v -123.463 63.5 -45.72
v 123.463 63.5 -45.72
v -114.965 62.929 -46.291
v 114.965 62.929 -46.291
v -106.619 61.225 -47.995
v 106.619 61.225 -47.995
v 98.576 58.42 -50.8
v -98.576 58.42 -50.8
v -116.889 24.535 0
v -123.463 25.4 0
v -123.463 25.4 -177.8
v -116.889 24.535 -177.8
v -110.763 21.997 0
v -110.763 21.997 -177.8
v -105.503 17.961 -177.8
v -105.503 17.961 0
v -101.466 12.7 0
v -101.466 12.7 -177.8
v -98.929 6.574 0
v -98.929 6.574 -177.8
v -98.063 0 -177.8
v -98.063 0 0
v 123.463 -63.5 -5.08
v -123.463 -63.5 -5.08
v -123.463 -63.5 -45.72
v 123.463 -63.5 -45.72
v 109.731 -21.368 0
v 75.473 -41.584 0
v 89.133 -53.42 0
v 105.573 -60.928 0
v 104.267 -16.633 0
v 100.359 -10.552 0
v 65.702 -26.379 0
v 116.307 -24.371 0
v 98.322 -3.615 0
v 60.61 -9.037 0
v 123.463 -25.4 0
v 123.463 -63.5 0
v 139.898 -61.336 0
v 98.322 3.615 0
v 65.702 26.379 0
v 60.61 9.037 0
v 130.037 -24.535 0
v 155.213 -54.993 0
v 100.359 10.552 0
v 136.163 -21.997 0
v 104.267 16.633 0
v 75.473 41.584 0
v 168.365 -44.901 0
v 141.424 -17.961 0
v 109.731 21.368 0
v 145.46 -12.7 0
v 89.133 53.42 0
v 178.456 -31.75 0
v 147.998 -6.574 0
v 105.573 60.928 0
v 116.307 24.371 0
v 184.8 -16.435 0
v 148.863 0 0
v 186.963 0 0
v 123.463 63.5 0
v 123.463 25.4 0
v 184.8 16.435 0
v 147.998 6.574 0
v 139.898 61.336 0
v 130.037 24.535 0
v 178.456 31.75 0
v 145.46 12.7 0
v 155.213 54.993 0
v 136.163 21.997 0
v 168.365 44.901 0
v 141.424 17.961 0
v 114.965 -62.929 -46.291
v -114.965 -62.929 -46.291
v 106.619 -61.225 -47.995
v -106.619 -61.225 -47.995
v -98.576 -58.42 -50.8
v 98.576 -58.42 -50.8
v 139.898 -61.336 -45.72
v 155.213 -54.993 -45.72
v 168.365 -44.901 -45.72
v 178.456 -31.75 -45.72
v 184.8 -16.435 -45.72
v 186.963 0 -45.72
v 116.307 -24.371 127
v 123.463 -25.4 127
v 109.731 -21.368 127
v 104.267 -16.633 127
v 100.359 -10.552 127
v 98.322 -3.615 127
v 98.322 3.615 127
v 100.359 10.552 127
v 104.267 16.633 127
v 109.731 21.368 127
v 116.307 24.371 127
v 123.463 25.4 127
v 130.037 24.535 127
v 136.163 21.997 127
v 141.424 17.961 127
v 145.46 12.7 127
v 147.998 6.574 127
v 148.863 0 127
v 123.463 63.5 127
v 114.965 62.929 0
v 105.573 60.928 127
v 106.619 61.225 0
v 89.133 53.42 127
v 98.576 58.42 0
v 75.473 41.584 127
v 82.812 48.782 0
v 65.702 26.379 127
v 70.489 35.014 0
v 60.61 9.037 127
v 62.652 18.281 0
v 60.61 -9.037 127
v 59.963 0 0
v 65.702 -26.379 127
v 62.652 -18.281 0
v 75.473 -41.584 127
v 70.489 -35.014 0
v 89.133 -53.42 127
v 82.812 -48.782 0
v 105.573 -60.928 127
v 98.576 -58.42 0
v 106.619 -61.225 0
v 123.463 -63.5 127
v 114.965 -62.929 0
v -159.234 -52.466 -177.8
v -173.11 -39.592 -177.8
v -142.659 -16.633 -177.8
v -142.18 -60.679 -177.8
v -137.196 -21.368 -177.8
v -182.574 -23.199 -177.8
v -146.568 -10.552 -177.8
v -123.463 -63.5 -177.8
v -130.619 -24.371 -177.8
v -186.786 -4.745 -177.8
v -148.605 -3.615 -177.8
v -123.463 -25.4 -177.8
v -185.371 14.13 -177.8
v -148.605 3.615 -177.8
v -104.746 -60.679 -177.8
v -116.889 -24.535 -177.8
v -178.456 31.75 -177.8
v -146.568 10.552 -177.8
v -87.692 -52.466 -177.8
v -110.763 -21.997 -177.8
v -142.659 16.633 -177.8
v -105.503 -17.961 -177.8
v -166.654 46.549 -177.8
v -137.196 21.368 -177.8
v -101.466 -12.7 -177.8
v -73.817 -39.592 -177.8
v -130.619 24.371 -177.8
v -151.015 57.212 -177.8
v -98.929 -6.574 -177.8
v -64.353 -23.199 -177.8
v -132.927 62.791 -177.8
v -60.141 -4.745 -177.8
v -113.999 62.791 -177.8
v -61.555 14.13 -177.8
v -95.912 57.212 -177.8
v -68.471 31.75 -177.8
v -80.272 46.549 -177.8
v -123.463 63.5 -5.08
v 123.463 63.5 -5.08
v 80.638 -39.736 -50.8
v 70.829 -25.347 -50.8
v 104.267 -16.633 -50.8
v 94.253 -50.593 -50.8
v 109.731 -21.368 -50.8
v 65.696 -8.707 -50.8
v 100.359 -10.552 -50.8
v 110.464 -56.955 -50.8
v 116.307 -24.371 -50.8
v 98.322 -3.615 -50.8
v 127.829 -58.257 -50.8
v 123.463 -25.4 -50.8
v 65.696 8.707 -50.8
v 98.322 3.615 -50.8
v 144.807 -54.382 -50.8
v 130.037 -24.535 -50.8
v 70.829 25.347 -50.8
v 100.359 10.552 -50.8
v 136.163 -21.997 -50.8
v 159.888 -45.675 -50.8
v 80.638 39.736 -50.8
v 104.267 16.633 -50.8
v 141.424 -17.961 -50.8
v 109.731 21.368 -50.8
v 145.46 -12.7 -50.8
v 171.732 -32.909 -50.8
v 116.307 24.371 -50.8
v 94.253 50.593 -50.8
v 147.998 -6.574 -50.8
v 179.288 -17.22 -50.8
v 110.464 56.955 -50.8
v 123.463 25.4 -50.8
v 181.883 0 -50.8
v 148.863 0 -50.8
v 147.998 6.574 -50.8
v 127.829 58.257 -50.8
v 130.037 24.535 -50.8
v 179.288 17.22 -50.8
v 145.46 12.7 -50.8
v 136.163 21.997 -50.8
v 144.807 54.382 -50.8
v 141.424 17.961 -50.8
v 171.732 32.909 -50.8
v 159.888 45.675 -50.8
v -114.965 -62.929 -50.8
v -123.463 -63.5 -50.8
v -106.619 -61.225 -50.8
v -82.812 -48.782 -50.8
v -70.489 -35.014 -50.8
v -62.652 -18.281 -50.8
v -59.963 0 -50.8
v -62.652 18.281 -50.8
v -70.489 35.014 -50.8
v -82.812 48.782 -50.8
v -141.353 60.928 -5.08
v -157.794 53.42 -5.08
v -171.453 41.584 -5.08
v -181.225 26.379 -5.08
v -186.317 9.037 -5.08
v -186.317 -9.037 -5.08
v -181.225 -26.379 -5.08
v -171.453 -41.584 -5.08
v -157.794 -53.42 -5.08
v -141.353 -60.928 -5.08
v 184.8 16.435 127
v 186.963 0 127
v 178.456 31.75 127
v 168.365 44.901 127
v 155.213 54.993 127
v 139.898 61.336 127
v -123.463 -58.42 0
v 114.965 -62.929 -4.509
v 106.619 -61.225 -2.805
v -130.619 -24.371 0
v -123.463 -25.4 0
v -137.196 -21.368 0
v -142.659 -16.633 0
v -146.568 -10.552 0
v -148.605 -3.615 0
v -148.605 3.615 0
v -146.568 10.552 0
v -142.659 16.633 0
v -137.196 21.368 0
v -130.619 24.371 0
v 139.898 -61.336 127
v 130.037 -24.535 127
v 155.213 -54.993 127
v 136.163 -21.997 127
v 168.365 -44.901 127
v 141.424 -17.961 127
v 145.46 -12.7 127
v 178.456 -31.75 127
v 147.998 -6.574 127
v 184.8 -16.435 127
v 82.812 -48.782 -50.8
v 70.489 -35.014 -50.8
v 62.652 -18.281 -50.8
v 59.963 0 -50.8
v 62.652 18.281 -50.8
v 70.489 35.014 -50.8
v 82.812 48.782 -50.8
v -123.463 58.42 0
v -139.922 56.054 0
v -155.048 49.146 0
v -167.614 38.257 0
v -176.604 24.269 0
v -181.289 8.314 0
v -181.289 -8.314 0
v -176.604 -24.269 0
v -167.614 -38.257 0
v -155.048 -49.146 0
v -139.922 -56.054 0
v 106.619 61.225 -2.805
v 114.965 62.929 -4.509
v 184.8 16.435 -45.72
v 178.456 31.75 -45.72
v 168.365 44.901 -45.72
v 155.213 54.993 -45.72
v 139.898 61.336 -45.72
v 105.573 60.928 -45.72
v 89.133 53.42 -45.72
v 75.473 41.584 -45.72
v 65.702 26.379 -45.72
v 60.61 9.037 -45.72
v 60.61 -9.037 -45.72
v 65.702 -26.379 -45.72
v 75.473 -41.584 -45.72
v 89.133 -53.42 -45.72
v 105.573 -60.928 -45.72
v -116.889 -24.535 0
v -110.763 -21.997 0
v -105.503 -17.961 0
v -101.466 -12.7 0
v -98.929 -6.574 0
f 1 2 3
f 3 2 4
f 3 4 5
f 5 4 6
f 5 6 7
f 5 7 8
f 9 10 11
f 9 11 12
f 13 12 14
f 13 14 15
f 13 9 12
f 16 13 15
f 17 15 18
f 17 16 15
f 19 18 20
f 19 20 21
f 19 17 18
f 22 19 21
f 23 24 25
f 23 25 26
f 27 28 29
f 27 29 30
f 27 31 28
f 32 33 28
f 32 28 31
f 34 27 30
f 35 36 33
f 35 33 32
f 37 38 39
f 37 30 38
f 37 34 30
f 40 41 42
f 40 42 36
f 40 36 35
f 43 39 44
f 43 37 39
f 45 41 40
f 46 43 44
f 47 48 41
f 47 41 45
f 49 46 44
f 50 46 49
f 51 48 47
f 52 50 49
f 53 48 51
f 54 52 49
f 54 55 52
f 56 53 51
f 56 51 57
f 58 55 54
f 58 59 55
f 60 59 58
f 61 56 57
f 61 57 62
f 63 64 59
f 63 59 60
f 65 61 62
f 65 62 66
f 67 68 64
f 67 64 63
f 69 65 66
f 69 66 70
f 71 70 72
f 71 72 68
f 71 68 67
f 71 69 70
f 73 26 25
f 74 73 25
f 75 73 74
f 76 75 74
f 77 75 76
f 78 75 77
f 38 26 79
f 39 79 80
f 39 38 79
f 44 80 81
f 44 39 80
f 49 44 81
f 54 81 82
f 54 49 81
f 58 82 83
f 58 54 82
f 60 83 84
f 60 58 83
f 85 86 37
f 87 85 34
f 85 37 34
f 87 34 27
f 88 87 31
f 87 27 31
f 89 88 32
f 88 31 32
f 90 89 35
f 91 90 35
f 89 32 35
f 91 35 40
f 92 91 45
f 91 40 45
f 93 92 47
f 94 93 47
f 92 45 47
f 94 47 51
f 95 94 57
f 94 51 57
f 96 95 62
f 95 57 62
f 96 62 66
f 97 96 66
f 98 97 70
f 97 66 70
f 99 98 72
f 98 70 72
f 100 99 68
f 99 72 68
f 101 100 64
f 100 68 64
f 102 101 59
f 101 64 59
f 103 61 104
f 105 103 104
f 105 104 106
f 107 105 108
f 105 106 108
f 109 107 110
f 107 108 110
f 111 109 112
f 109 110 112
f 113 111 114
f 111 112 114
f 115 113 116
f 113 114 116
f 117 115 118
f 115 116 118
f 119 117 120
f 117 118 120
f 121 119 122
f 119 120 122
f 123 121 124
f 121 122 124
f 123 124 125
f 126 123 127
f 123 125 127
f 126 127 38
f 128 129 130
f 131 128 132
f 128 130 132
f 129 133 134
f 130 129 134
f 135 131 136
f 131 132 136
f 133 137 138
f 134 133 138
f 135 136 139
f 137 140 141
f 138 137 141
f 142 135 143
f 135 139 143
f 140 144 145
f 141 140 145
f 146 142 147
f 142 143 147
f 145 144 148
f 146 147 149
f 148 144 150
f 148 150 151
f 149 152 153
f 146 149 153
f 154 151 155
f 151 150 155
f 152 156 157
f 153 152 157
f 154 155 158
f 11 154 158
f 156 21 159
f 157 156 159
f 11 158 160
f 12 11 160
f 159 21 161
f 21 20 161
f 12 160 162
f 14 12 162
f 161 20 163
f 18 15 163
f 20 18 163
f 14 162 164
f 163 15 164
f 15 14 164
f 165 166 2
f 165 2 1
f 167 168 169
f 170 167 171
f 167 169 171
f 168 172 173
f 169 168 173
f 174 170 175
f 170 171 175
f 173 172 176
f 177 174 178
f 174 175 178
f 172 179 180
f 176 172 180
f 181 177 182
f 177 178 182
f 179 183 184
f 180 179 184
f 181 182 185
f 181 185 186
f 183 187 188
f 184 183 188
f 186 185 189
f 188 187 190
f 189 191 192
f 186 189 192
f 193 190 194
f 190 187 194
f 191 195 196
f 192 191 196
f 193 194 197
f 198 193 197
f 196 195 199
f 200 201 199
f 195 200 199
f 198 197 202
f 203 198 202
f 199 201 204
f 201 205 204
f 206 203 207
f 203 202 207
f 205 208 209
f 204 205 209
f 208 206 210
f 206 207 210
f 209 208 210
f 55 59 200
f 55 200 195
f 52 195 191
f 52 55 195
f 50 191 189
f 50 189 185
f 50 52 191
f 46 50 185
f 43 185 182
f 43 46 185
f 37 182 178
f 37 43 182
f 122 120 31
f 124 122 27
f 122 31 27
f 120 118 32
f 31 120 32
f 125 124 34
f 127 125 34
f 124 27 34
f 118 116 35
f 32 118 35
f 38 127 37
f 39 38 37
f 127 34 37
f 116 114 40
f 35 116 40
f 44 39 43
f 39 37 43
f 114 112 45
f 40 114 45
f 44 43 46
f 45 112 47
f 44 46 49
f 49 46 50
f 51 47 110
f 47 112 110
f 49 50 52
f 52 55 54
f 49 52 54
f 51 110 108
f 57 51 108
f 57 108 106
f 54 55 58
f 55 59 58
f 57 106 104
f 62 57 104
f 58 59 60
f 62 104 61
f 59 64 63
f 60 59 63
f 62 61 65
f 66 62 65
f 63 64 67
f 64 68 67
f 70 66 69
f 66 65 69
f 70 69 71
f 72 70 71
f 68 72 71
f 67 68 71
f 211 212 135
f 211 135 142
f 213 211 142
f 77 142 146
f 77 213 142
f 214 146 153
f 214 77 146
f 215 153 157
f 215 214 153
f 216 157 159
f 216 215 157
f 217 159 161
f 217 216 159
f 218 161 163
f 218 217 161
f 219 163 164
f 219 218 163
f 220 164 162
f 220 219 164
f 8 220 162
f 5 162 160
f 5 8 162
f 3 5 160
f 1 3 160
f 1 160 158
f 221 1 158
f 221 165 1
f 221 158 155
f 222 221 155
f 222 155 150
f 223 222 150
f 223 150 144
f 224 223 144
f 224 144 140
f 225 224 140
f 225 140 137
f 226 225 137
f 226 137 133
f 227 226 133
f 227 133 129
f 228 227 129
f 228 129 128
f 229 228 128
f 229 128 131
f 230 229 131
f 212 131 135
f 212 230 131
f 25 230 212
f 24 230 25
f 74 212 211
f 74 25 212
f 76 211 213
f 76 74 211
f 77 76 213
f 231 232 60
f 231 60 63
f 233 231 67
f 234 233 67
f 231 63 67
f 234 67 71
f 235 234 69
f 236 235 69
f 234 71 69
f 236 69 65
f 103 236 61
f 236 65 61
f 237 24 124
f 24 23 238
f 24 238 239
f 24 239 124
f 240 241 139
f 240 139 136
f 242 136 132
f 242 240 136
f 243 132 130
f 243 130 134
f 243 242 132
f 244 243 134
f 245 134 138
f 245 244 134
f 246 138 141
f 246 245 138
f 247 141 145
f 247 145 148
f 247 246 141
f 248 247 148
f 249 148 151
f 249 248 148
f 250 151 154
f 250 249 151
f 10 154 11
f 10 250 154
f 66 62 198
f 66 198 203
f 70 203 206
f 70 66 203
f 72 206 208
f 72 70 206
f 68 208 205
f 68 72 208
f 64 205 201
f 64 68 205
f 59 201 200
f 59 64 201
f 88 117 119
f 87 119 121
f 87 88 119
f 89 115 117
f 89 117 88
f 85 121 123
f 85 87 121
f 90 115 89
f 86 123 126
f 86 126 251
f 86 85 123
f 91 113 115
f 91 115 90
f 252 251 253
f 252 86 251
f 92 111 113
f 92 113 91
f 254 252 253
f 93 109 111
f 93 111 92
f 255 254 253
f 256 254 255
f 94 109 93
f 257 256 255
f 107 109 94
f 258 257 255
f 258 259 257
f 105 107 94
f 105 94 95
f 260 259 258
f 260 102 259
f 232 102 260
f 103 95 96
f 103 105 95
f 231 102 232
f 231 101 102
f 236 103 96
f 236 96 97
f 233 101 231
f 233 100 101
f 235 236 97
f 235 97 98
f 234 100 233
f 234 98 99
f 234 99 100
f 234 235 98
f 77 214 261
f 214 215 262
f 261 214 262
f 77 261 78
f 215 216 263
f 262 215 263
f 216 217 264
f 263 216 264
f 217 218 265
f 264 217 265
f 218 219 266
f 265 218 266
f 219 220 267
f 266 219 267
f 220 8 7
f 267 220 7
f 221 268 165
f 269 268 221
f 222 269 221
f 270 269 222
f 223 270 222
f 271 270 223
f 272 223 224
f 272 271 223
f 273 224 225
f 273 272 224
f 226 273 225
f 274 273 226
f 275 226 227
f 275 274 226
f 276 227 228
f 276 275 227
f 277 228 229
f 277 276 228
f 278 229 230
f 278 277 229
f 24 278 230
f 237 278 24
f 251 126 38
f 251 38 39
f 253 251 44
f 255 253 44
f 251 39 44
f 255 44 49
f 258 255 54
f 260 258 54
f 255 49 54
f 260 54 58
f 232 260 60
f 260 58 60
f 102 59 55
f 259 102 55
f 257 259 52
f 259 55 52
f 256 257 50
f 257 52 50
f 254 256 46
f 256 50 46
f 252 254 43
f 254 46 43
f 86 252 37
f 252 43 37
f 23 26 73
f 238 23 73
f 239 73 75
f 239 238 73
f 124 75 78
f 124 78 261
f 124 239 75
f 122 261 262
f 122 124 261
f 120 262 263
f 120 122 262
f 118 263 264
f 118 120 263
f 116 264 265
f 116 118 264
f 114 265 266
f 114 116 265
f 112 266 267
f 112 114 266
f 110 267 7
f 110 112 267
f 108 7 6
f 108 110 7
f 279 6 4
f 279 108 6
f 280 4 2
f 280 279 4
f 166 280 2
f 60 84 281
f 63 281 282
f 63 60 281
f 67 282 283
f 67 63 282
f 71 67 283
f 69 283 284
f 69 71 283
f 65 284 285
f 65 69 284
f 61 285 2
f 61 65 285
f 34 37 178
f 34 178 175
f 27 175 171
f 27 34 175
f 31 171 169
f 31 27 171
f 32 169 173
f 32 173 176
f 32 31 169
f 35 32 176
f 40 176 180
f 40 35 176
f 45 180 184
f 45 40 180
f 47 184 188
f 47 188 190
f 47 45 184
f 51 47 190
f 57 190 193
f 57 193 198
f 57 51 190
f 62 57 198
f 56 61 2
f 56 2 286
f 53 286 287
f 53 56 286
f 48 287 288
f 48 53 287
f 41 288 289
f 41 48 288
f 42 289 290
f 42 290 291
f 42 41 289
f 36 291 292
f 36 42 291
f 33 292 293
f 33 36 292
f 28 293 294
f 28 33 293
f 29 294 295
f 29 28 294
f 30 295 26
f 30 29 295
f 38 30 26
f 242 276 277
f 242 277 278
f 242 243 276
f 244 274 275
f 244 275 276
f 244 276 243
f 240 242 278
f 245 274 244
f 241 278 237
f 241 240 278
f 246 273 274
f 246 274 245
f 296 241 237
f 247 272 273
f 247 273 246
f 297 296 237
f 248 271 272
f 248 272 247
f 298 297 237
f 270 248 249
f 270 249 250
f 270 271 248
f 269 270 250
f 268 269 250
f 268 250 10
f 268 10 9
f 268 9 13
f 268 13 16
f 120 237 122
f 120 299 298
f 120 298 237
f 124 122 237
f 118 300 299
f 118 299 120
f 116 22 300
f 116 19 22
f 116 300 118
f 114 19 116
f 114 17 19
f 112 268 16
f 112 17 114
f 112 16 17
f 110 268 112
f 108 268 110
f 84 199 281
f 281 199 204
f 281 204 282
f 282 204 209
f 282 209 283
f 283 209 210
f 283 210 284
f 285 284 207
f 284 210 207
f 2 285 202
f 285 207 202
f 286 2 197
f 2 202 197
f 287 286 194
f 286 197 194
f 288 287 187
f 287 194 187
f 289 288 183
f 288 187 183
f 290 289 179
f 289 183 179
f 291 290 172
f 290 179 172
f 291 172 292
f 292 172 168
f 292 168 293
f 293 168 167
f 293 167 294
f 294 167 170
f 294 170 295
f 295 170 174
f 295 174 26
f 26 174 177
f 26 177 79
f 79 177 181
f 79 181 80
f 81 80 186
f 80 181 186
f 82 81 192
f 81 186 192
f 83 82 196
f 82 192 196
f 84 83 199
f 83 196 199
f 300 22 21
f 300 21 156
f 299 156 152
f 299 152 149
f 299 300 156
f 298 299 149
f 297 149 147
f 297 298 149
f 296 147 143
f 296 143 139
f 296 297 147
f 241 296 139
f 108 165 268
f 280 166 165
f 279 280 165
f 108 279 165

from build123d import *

# Parameters (mm, degrees)
F1_DEPTH     = 127
F2_DEPTH     = 177.8
F3_DEPTH     = 50.8
F4_DEPTH     = 50.8
F5_T1_DEPTH  = 286.1190739645
F5_T4_ANGLE  = 180
F5_T8_DEPTH  = 325.3115227011
F5_S9_R      = 63.5
F5_T10_DEPTH = 164
F5_T14_DEPTH = 325.3115227011
F5_S15_R     = 63.5
F5_T16_DEPTH = 164


# Not quite as in the source:
# - a fillet or chamfer that OpenCascade refuses, or shapes differently, is made with other operations: its cross-section is extruded or revolved along the edge and cut away or added


with BuildPart() as f1:
    # F0 (on Top) → F1 (new body)
    with BuildSketch(Plane.XY):
        with BuildLine():
            ThreePointArc((123.463312614, 63.5), (59.963312614, 0), (123.463312614, -63.5))
            Line((123.463312614, -63.5), (123.463312614, -25.4))
            ThreePointArc((123.463312614, -25.4), (98.063312614, 0), (123.463312614, 25.4))
            Line((123.463312614, 25.4), (123.463312614, 63.5))
        make_face()
        with BuildLine():
            Line((123.463312614, -25.4), (123.463312614, -63.5))
            ThreePointArc((123.463312614, -63.5), (168.3645932193, -44.9012806053), (186.963312614, 0))
            ThreePointArc((186.963312614, 0), (168.3645932193, 44.9012806053), (123.463312614, 63.5))
            Line((123.463312614, 63.5), (123.463312614, 25.4))
            ThreePointArc((123.463312614, 25.4), (141.4238248561, 17.9605122421), (148.863312614, 0))
            ThreePointArc((148.863312614, 0), (141.4238248561, -17.9605122421), (123.463312614, -25.4))
        make_face()
    extrude(amount=F1_DEPTH)



with BuildPart() as f2:
    # F0 (on Top) → F2 (new body)
    with BuildSketch(Plane.XY):
        with BuildLine():
            ThreePointArc((-123.463312614, 63.5), (-186.963312614, 0), (-123.463312614, -63.5))
            Line((-123.463312614, -63.5), (-123.463312614, -25.4))
            ThreePointArc((-123.463312614, -25.4), (-148.863312614, 0), (-123.463312614, 25.4))
            Line((-123.463312614, 25.4), (-123.463312614, 63.5))
        make_face()
        with BuildLine():
            Line((-123.463312614, -25.4), (-123.463312614, -63.5))
            ThreePointArc((-123.463312614, -63.5), (-78.5620320086, -44.9012806053), (-59.963312614, 0))
            ThreePointArc((-59.963312614, 0), (-78.5620320086, 44.9012806053), (-123.463312614, 63.5))
            Line((-123.463312614, 63.5), (-123.463312614, 25.4))
            ThreePointArc((-123.463312614, 25.4), (-105.5028003718, 17.9605122421), (-98.063312614, 0))
            ThreePointArc((-98.063312614, 0), (-105.5028003718, -17.9605122421), (-123.463312614, -25.4))
        make_face()
    extrude(amount=-F2_DEPTH)


with BuildPart() as f1_1:
    add(f1.part)

    add(f2.part)  # F3 merges F2
    # F0 (on Top) → F3 (join)
    with BuildSketch(Plane.XY):
        with BuildLine():
            Line((-123.463312614, -63.5), (123.463312614, -63.5))
            ThreePointArc((123.463312614, -63.5), (59.963312614, 0), (123.463312614, 63.5))
            Line((123.463312614, 63.5), (-123.463312614, 63.5))
            ThreePointArc((-123.463312614, 63.5), (-78.5620320086, 44.9012806053), (-59.963312614, 0))
            ThreePointArc((-59.963312614, 0), (-78.5620320086, -44.9012806053), (-123.463312614, -63.5))
        make_face()
    extrude(amount=-F3_DEPTH)

    # F5: chamfer of 5.08 on 3 edges, made by hand

    # F5_s2 → F5_t1 (cut)
    with BuildSketch(Plane.YZ.offset(-123.463312614)):
        Polygon((63.5, -5.08), (58.42, 0), (63.5, 0), align=None)
        Polygon((-63.5, -5.08), (-58.42, 0), (-63.5, 0), align=None)
    extrude(amount=F5_T1_DEPTH, mode=Mode.SUBTRACT)

    # F5_s3 → F5_t4 (revolve, cut)
    with BuildSketch(Plane.YZ.offset(-123.463312614)):
        Polygon((63.5, -5.08), (58.42, 0), (63.5, 0), align=None)
    revolve(axis=Axis((-123.463312614, 0, 0), (0, 0, 1)), revolution_arc=F5_T4_ANGLE, mode=Mode.SUBTRACT)


with BuildPart() as f4:
    # F0 (on Top) → F4 (new body)
    with BuildSketch(Plane.XY):
        with BuildLine():
            Line((123.463312614, -25.4), (123.463312614, -63.5))
            ThreePointArc((123.463312614, -63.5), (168.3645932193, -44.9012806053), (186.963312614, 0))
            ThreePointArc((186.963312614, 0), (168.3645932193, 44.9012806053), (123.463312614, 63.5))
            Line((123.463312614, 63.5), (123.463312614, 25.4))
            ThreePointArc((123.463312614, 25.4), (141.4238248561, 17.9605122421), (148.863312614, 0))
            ThreePointArc((148.863312614, 0), (141.4238248561, -17.9605122421), (123.463312614, -25.4))
        make_face()
        with BuildLine():
            ThreePointArc((123.463312614, 63.5), (59.963312614, 0), (123.463312614, -63.5))
            Line((123.463312614, -63.5), (123.463312614, -25.4))
            ThreePointArc((123.463312614, -25.4), (98.063312614, 0), (123.463312614, 25.4))
            Line((123.463312614, 25.4), (123.463312614, 63.5))
        make_face()
    extrude(amount=-F4_DEPTH)

    # F5#2: chamfer of 5.08 on 1 edges, made by hand

    # F5_2_s1 → F5_2_t2 (revolve, cut)
    with BuildSketch(Plane.XZ):
        Polygon((186.963312614, -45.72), (181.883312614, -50.8), (186.963312614, -50.8), align=None)
    revolve(axis=Axis((123.463312614, 0, -50.8), (0, 0, 1)), mode=Mode.SUBTRACT)


with BuildPart() as f5_tool6:
    # F5_s7 → F5_t8 (new body)
    with BuildSketch(Plane.YZ.offset(-162.6557613506)):
        Polygon((-63.5, -45.72), (-58.42, -50.8), (-63.5, -50.8), align=None)
    extrude(amount=F5_T8_DEPTH)

    # F5_s9 → F5_t10 (cut, symmetric)
    with BuildSketch(Plane.XY.offset(-48.3)):
        with Locations((-123.463312614, 0)):
            Circle(F5_S9_R)
    extrude(amount=F5_T10_DEPTH, both=True, mode=Mode.SUBTRACT)


with BuildPart() as f1_2:
    add(f1_1.part)

    # F5_t5: cut F5_tool6
    add(f5_tool6.part, mode=Mode.SUBTRACT)


with BuildPart() as f5_tool12:
    # F5_s13 → F5_t14 (new body)
    with BuildSketch(Plane.YZ.offset(162.6557613506)):
        Polygon((58.42, -50.8), (63.5, -45.72), (63.5, -50.8), align=None)
    extrude(amount=-F5_T14_DEPTH)

    # F5_s15 → F5_t16 (cut, symmetric)
    with BuildSketch(Plane.XY.offset(-48.3)):
        with Locations((-123.463312614, 0)):
            Circle(F5_S15_R)
    extrude(amount=F5_T16_DEPTH, both=True, mode=Mode.SUBTRACT)


with BuildPart() as f1_3:
    add(f1_2.part)

    # F5_t11: cut F5_tool12
    add(f5_tool12.part, mode=Mode.SUBTRACT)


solid = Compound([f4.part, f1_3.part])
